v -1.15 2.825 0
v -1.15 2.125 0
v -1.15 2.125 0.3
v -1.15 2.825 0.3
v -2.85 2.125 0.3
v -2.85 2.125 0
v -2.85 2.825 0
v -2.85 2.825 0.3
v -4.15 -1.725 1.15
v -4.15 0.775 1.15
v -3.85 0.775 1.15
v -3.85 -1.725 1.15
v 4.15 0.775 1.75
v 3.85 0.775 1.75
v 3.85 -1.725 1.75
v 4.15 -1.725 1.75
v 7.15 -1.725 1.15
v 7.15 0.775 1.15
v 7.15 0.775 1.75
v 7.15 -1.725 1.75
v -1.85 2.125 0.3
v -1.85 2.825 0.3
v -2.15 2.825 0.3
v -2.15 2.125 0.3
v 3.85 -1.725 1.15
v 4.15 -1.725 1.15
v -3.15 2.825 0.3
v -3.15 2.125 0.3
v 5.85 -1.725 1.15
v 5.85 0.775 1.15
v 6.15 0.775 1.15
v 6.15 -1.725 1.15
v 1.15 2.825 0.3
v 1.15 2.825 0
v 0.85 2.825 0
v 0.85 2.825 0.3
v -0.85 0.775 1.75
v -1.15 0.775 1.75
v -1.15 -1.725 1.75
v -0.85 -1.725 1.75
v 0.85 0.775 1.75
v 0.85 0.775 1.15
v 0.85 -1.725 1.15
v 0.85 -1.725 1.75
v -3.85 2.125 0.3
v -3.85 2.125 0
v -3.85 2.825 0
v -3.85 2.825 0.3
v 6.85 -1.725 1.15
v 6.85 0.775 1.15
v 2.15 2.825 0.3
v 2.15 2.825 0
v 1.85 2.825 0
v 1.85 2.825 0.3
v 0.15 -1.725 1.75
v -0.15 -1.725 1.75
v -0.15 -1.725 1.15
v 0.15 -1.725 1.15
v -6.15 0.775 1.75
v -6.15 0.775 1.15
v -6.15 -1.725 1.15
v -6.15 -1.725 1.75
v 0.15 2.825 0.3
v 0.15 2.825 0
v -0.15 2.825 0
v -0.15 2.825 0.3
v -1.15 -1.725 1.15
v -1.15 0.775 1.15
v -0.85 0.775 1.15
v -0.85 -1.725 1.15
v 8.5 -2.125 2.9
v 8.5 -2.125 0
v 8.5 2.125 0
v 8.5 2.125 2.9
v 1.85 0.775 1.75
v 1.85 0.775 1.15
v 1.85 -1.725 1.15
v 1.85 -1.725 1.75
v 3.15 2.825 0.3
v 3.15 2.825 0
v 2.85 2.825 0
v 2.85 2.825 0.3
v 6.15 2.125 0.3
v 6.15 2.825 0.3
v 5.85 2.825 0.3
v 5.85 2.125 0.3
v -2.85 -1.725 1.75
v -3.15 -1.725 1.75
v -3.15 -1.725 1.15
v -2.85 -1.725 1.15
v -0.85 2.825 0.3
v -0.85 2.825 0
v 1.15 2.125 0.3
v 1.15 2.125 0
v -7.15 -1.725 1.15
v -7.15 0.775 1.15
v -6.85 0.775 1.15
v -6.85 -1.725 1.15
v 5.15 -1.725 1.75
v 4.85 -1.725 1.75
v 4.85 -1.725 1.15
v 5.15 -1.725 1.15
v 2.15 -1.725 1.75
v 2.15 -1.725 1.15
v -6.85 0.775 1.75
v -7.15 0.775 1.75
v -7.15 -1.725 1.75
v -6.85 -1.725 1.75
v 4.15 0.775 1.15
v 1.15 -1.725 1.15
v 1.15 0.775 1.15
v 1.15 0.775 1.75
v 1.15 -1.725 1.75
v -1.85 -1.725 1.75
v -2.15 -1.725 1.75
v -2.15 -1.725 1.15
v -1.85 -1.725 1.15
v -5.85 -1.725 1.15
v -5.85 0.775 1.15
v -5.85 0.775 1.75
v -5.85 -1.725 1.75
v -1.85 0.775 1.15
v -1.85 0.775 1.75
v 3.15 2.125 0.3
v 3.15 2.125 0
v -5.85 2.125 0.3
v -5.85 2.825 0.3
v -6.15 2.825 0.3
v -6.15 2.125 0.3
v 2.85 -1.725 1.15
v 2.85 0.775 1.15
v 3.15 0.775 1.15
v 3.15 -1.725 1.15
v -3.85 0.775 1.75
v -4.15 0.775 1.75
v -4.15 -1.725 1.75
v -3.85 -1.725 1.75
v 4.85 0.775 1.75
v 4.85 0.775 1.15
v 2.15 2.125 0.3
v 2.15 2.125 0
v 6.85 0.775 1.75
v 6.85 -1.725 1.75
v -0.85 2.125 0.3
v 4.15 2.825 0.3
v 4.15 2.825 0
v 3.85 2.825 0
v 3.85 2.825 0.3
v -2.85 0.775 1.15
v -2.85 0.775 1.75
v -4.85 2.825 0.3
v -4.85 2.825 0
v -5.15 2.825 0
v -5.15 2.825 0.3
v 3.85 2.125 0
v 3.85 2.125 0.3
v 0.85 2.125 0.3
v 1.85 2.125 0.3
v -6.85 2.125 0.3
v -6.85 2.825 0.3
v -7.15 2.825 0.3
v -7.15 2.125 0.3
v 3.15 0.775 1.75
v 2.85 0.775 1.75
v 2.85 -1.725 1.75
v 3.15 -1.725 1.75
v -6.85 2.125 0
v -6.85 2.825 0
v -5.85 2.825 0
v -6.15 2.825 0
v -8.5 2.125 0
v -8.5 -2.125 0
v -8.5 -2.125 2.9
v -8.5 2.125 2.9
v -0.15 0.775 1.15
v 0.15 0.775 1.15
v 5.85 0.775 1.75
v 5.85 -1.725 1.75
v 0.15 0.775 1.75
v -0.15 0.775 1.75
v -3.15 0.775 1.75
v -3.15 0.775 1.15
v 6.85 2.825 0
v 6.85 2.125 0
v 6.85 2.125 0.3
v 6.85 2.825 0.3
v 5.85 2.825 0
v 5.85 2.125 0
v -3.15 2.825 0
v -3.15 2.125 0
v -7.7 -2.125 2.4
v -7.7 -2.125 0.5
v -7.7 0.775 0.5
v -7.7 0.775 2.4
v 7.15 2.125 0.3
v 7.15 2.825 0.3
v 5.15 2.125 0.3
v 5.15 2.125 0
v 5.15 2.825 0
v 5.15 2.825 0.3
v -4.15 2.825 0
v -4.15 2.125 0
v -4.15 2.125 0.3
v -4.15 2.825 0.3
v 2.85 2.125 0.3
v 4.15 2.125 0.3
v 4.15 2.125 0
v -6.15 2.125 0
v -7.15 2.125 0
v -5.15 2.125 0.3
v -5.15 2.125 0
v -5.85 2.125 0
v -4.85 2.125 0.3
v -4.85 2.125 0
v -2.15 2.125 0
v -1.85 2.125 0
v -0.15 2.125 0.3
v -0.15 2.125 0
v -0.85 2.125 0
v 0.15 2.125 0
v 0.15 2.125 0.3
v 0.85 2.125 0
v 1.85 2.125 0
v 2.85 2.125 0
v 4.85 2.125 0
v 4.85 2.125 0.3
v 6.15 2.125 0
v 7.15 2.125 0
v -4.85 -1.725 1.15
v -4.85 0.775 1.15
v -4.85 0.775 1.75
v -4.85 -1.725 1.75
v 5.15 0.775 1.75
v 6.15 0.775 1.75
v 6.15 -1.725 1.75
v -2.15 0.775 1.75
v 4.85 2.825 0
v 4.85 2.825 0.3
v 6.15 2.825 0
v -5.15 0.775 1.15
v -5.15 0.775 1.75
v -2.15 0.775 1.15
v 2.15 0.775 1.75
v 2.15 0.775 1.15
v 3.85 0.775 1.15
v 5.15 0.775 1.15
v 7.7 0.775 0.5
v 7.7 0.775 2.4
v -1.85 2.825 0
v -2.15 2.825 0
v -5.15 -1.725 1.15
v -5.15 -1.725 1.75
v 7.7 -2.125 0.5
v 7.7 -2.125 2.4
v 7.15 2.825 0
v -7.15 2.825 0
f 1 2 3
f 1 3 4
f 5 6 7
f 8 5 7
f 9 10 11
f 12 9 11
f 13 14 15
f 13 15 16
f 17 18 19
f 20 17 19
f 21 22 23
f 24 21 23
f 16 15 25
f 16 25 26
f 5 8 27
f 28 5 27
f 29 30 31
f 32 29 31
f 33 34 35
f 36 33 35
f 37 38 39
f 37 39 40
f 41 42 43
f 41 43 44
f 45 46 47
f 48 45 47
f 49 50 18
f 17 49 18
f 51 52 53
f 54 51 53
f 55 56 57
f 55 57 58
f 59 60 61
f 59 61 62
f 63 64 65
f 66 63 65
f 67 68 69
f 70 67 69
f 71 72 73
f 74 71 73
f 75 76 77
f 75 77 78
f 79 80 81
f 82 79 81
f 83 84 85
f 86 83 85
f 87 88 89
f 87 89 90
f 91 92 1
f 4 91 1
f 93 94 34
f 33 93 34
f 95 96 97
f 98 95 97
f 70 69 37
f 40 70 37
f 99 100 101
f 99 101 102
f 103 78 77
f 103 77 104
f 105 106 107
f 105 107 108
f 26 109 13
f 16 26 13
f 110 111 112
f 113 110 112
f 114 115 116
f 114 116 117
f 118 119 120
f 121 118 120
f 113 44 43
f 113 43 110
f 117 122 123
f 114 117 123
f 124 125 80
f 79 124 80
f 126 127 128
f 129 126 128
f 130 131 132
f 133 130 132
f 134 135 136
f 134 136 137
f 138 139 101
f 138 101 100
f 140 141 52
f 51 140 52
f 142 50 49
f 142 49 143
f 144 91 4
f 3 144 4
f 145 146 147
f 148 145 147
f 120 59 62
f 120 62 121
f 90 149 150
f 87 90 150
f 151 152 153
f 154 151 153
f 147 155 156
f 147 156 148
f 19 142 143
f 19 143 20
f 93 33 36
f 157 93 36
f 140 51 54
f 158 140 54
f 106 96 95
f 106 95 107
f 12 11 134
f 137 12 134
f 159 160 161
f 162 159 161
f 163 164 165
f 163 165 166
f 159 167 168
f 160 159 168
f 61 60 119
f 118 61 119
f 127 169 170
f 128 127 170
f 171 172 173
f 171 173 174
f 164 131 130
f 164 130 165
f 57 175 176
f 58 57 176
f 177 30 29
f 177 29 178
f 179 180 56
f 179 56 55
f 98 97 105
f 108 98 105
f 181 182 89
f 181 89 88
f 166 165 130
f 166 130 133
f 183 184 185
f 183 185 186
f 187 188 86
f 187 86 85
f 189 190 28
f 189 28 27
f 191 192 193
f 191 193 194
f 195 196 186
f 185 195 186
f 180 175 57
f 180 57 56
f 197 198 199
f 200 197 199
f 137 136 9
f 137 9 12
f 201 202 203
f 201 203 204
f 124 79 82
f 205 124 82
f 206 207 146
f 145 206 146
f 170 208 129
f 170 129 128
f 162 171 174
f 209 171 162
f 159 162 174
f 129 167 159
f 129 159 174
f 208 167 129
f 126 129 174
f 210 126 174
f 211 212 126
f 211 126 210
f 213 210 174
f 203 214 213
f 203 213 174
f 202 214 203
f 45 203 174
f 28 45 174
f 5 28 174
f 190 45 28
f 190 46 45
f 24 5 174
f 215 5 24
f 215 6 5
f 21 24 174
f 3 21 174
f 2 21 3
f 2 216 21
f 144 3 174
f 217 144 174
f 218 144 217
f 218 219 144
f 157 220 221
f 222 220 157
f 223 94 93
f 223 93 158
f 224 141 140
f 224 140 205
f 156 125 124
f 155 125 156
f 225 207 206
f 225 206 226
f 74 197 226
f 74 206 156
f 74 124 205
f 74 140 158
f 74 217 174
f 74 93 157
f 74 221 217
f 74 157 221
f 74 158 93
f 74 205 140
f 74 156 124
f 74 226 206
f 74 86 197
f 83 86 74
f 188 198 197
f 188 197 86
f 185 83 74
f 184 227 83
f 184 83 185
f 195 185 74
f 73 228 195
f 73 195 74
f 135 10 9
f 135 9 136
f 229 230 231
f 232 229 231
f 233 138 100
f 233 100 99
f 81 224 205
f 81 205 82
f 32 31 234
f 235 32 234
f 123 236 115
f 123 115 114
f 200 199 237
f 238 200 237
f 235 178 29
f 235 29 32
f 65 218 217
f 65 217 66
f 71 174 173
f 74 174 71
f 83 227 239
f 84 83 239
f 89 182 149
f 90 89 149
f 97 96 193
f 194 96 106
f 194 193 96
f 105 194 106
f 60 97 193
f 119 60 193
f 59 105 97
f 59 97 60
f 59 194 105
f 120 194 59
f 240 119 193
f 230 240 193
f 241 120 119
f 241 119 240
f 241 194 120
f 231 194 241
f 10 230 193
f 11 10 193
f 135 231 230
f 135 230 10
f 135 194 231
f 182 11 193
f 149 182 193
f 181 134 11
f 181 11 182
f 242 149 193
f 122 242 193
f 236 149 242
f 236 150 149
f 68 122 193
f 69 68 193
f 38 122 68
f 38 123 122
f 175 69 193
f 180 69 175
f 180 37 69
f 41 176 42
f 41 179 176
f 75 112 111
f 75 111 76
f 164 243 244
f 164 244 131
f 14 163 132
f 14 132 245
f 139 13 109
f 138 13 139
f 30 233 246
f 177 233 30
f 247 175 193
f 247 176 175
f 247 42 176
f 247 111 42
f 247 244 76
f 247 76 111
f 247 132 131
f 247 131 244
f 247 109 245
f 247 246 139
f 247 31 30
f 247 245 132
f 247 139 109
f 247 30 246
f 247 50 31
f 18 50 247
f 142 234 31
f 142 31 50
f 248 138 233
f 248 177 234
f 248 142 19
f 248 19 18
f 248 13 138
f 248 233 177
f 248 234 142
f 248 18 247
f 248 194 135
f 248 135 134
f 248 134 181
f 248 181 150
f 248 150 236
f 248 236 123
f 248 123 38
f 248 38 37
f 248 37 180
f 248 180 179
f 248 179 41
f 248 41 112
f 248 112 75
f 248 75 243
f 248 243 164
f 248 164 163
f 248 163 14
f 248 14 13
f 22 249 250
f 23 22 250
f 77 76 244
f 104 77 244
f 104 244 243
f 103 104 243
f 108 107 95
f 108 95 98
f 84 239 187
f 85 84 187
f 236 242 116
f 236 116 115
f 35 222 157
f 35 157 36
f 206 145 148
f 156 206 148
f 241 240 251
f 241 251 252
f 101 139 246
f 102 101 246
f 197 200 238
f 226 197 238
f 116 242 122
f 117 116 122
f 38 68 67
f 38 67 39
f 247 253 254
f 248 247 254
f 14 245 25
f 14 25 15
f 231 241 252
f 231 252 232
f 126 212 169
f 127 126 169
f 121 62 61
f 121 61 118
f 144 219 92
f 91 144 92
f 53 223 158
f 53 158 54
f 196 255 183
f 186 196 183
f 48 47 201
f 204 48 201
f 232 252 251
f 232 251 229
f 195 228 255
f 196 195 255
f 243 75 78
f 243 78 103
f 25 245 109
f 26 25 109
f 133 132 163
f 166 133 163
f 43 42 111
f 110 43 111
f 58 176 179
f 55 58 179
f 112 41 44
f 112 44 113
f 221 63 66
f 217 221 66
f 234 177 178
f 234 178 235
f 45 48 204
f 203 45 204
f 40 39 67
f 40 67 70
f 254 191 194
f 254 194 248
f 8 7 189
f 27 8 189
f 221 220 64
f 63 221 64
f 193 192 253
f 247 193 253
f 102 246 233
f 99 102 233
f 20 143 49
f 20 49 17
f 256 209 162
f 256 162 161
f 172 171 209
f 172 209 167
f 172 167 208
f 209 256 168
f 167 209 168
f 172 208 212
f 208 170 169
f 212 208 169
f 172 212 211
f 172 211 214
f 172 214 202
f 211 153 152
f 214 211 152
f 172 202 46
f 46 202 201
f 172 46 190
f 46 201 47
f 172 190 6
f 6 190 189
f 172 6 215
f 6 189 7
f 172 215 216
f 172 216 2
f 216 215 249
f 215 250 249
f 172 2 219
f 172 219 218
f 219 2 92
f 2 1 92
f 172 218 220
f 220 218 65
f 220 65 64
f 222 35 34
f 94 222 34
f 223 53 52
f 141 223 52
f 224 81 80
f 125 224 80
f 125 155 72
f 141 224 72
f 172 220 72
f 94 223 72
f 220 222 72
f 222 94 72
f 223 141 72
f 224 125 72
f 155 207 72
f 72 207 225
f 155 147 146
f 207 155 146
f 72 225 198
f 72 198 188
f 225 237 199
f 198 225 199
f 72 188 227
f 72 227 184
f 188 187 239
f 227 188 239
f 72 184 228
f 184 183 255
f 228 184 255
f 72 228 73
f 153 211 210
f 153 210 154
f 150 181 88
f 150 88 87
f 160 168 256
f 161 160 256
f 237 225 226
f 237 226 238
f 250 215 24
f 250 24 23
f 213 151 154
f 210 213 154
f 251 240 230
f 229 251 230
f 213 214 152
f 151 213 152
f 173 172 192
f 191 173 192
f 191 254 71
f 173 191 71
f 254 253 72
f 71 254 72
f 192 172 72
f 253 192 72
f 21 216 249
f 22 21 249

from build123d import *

# Parameters (mm, degrees)
SKETCH1_W           = 17
SKETCH1_H           = 4.25
BOSS_EXTRUDE1_DEPTH = 2.9
SKETCH2_W           = 15.4
SKETCH2_H           = 1.9
CUT_EXTRUDE1_DEPTH  = 2.9
SKETCH3_W           = 0.3
SKETCH3_H           = 0.6
BOSS_EXTRUDE2_DEPTH = 2.5
SKETCH4_W           = 0.3
SKETCH4_H           = 0.8
BOSS_EXTRUDE3_DEPTH = 0.3


with BuildPart() as part:
    # Sketch1 → Boss-Extrude1 (new body)
    with BuildSketch(Plane.XY):
        Rectangle(SKETCH1_W, SKETCH1_H)
    extrude(amount=BOSS_EXTRUDE1_DEPTH)

    # Sketch2 → Cut-Extrude1 (cut)
    with BuildSketch(Plane.XZ.offset(2.125)):
        with Locations((0, 1.45)):
            Rectangle(SKETCH2_W, SKETCH2_H)
    extrude(amount=-CUT_EXTRUDE1_DEPTH, mode=Mode.SUBTRACT)

    # Sketch3 → Boss-Extrude2 (add)
    with BuildSketch(Plane.XZ.offset(-0.775)):
        with Locations((-7, 1.45)):
            Rectangle(SKETCH3_W, SKETCH3_H)
        with Locations((-6, 1.45)):
            Rectangle(SKETCH3_W, SKETCH3_H)
        with Locations((-5, 1.45)):
            Rectangle(SKETCH3_W, SKETCH3_H)
        with Locations((-4, 1.45)):
            Rectangle(SKETCH3_W, SKETCH3_H)
        with Locations((-3, 1.45)):
            Rectangle(SKETCH3_W, SKETCH3_H)
        with Locations((-2, 1.45)):
            Rectangle(SKETCH3_W, SKETCH3_H)
        with Locations((-1, 1.45)):
            Rectangle(SKETCH3_W, SKETCH3_H)
        with Locations((0, 1.45)):
            Rectangle(SKETCH3_W, SKETCH3_H)
        with Locations((1, 1.45)):
            Rectangle(SKETCH3_W, SKETCH3_H)
        with Locations((2, 1.45)):
            Rectangle(SKETCH3_W, SKETCH3_H)
        with Locations((3, 1.45)):
            Rectangle(SKETCH3_W, SKETCH3_H)
        with Locations((4, 1.45)):
            Rectangle(SKETCH3_W, SKETCH3_H)
        with Locations((5, 1.45)):
            Rectangle(SKETCH3_W, SKETCH3_H)
        with Locations((6, 1.45)):
            Rectangle(SKETCH3_W, SKETCH3_H)
        with Locations((7, 1.45)):
            Rectangle(SKETCH3_W, SKETCH3_H)
    extrude(amount=BOSS_EXTRUDE2_DEPTH)

    # Sketch4 → Boss-Extrude3 (add)
    with BuildSketch(Plane(origin=(0, 0, 0), x_dir=(-1, 0, 0), z_dir=(0, 0, -1))):
        with Locations((-7, 2.425)):
            Rectangle(SKETCH4_W, SKETCH4_H)
        with Locations((-6, 2.425)):
            Rectangle(SKETCH4_W, SKETCH4_H)
        with Locations((-5, 2.425)):
            Rectangle(SKETCH4_W, SKETCH4_H)
        with Locations((-4, 2.425)):
            Rectangle(SKETCH4_W, SKETCH4_H)
        with Locations((-3, 2.425)):
            Rectangle(SKETCH4_W, SKETCH4_H)
        with Locations((-2, 2.425)):
            Rectangle(SKETCH4_W, SKETCH4_H)
        with Locations((-1, 2.425)):
            Rectangle(SKETCH4_W, SKETCH4_H)
        with Locations((0, 2.425)):
            Rectangle(SKETCH4_W, SKETCH4_H)
        with Locations((1, 2.425)):
            Rectangle(SKETCH4_W, SKETCH4_H)
        with Locations((2, 2.425)):
            Rectangle(SKETCH4_W, SKETCH4_H)
        with Locations((3, 2.425)):
            Rectangle(SKETCH4_W, SKETCH4_H)
        with Locations((4, 2.425)):
            Rectangle(SKETCH4_W, SKETCH4_H)
        with Locations((5, 2.425)):
            Rectangle(SKETCH4_W, SKETCH4_H)
        with Locations((6, 2.425)):
            Rectangle(SKETCH4_W, SKETCH4_H)
        with Locations((7, 2.425)):
            Rectangle(SKETCH4_W, SKETCH4_H)
    extrude(amount=-BOSS_EXTRUDE3_DEPTH)


solid = part.part
